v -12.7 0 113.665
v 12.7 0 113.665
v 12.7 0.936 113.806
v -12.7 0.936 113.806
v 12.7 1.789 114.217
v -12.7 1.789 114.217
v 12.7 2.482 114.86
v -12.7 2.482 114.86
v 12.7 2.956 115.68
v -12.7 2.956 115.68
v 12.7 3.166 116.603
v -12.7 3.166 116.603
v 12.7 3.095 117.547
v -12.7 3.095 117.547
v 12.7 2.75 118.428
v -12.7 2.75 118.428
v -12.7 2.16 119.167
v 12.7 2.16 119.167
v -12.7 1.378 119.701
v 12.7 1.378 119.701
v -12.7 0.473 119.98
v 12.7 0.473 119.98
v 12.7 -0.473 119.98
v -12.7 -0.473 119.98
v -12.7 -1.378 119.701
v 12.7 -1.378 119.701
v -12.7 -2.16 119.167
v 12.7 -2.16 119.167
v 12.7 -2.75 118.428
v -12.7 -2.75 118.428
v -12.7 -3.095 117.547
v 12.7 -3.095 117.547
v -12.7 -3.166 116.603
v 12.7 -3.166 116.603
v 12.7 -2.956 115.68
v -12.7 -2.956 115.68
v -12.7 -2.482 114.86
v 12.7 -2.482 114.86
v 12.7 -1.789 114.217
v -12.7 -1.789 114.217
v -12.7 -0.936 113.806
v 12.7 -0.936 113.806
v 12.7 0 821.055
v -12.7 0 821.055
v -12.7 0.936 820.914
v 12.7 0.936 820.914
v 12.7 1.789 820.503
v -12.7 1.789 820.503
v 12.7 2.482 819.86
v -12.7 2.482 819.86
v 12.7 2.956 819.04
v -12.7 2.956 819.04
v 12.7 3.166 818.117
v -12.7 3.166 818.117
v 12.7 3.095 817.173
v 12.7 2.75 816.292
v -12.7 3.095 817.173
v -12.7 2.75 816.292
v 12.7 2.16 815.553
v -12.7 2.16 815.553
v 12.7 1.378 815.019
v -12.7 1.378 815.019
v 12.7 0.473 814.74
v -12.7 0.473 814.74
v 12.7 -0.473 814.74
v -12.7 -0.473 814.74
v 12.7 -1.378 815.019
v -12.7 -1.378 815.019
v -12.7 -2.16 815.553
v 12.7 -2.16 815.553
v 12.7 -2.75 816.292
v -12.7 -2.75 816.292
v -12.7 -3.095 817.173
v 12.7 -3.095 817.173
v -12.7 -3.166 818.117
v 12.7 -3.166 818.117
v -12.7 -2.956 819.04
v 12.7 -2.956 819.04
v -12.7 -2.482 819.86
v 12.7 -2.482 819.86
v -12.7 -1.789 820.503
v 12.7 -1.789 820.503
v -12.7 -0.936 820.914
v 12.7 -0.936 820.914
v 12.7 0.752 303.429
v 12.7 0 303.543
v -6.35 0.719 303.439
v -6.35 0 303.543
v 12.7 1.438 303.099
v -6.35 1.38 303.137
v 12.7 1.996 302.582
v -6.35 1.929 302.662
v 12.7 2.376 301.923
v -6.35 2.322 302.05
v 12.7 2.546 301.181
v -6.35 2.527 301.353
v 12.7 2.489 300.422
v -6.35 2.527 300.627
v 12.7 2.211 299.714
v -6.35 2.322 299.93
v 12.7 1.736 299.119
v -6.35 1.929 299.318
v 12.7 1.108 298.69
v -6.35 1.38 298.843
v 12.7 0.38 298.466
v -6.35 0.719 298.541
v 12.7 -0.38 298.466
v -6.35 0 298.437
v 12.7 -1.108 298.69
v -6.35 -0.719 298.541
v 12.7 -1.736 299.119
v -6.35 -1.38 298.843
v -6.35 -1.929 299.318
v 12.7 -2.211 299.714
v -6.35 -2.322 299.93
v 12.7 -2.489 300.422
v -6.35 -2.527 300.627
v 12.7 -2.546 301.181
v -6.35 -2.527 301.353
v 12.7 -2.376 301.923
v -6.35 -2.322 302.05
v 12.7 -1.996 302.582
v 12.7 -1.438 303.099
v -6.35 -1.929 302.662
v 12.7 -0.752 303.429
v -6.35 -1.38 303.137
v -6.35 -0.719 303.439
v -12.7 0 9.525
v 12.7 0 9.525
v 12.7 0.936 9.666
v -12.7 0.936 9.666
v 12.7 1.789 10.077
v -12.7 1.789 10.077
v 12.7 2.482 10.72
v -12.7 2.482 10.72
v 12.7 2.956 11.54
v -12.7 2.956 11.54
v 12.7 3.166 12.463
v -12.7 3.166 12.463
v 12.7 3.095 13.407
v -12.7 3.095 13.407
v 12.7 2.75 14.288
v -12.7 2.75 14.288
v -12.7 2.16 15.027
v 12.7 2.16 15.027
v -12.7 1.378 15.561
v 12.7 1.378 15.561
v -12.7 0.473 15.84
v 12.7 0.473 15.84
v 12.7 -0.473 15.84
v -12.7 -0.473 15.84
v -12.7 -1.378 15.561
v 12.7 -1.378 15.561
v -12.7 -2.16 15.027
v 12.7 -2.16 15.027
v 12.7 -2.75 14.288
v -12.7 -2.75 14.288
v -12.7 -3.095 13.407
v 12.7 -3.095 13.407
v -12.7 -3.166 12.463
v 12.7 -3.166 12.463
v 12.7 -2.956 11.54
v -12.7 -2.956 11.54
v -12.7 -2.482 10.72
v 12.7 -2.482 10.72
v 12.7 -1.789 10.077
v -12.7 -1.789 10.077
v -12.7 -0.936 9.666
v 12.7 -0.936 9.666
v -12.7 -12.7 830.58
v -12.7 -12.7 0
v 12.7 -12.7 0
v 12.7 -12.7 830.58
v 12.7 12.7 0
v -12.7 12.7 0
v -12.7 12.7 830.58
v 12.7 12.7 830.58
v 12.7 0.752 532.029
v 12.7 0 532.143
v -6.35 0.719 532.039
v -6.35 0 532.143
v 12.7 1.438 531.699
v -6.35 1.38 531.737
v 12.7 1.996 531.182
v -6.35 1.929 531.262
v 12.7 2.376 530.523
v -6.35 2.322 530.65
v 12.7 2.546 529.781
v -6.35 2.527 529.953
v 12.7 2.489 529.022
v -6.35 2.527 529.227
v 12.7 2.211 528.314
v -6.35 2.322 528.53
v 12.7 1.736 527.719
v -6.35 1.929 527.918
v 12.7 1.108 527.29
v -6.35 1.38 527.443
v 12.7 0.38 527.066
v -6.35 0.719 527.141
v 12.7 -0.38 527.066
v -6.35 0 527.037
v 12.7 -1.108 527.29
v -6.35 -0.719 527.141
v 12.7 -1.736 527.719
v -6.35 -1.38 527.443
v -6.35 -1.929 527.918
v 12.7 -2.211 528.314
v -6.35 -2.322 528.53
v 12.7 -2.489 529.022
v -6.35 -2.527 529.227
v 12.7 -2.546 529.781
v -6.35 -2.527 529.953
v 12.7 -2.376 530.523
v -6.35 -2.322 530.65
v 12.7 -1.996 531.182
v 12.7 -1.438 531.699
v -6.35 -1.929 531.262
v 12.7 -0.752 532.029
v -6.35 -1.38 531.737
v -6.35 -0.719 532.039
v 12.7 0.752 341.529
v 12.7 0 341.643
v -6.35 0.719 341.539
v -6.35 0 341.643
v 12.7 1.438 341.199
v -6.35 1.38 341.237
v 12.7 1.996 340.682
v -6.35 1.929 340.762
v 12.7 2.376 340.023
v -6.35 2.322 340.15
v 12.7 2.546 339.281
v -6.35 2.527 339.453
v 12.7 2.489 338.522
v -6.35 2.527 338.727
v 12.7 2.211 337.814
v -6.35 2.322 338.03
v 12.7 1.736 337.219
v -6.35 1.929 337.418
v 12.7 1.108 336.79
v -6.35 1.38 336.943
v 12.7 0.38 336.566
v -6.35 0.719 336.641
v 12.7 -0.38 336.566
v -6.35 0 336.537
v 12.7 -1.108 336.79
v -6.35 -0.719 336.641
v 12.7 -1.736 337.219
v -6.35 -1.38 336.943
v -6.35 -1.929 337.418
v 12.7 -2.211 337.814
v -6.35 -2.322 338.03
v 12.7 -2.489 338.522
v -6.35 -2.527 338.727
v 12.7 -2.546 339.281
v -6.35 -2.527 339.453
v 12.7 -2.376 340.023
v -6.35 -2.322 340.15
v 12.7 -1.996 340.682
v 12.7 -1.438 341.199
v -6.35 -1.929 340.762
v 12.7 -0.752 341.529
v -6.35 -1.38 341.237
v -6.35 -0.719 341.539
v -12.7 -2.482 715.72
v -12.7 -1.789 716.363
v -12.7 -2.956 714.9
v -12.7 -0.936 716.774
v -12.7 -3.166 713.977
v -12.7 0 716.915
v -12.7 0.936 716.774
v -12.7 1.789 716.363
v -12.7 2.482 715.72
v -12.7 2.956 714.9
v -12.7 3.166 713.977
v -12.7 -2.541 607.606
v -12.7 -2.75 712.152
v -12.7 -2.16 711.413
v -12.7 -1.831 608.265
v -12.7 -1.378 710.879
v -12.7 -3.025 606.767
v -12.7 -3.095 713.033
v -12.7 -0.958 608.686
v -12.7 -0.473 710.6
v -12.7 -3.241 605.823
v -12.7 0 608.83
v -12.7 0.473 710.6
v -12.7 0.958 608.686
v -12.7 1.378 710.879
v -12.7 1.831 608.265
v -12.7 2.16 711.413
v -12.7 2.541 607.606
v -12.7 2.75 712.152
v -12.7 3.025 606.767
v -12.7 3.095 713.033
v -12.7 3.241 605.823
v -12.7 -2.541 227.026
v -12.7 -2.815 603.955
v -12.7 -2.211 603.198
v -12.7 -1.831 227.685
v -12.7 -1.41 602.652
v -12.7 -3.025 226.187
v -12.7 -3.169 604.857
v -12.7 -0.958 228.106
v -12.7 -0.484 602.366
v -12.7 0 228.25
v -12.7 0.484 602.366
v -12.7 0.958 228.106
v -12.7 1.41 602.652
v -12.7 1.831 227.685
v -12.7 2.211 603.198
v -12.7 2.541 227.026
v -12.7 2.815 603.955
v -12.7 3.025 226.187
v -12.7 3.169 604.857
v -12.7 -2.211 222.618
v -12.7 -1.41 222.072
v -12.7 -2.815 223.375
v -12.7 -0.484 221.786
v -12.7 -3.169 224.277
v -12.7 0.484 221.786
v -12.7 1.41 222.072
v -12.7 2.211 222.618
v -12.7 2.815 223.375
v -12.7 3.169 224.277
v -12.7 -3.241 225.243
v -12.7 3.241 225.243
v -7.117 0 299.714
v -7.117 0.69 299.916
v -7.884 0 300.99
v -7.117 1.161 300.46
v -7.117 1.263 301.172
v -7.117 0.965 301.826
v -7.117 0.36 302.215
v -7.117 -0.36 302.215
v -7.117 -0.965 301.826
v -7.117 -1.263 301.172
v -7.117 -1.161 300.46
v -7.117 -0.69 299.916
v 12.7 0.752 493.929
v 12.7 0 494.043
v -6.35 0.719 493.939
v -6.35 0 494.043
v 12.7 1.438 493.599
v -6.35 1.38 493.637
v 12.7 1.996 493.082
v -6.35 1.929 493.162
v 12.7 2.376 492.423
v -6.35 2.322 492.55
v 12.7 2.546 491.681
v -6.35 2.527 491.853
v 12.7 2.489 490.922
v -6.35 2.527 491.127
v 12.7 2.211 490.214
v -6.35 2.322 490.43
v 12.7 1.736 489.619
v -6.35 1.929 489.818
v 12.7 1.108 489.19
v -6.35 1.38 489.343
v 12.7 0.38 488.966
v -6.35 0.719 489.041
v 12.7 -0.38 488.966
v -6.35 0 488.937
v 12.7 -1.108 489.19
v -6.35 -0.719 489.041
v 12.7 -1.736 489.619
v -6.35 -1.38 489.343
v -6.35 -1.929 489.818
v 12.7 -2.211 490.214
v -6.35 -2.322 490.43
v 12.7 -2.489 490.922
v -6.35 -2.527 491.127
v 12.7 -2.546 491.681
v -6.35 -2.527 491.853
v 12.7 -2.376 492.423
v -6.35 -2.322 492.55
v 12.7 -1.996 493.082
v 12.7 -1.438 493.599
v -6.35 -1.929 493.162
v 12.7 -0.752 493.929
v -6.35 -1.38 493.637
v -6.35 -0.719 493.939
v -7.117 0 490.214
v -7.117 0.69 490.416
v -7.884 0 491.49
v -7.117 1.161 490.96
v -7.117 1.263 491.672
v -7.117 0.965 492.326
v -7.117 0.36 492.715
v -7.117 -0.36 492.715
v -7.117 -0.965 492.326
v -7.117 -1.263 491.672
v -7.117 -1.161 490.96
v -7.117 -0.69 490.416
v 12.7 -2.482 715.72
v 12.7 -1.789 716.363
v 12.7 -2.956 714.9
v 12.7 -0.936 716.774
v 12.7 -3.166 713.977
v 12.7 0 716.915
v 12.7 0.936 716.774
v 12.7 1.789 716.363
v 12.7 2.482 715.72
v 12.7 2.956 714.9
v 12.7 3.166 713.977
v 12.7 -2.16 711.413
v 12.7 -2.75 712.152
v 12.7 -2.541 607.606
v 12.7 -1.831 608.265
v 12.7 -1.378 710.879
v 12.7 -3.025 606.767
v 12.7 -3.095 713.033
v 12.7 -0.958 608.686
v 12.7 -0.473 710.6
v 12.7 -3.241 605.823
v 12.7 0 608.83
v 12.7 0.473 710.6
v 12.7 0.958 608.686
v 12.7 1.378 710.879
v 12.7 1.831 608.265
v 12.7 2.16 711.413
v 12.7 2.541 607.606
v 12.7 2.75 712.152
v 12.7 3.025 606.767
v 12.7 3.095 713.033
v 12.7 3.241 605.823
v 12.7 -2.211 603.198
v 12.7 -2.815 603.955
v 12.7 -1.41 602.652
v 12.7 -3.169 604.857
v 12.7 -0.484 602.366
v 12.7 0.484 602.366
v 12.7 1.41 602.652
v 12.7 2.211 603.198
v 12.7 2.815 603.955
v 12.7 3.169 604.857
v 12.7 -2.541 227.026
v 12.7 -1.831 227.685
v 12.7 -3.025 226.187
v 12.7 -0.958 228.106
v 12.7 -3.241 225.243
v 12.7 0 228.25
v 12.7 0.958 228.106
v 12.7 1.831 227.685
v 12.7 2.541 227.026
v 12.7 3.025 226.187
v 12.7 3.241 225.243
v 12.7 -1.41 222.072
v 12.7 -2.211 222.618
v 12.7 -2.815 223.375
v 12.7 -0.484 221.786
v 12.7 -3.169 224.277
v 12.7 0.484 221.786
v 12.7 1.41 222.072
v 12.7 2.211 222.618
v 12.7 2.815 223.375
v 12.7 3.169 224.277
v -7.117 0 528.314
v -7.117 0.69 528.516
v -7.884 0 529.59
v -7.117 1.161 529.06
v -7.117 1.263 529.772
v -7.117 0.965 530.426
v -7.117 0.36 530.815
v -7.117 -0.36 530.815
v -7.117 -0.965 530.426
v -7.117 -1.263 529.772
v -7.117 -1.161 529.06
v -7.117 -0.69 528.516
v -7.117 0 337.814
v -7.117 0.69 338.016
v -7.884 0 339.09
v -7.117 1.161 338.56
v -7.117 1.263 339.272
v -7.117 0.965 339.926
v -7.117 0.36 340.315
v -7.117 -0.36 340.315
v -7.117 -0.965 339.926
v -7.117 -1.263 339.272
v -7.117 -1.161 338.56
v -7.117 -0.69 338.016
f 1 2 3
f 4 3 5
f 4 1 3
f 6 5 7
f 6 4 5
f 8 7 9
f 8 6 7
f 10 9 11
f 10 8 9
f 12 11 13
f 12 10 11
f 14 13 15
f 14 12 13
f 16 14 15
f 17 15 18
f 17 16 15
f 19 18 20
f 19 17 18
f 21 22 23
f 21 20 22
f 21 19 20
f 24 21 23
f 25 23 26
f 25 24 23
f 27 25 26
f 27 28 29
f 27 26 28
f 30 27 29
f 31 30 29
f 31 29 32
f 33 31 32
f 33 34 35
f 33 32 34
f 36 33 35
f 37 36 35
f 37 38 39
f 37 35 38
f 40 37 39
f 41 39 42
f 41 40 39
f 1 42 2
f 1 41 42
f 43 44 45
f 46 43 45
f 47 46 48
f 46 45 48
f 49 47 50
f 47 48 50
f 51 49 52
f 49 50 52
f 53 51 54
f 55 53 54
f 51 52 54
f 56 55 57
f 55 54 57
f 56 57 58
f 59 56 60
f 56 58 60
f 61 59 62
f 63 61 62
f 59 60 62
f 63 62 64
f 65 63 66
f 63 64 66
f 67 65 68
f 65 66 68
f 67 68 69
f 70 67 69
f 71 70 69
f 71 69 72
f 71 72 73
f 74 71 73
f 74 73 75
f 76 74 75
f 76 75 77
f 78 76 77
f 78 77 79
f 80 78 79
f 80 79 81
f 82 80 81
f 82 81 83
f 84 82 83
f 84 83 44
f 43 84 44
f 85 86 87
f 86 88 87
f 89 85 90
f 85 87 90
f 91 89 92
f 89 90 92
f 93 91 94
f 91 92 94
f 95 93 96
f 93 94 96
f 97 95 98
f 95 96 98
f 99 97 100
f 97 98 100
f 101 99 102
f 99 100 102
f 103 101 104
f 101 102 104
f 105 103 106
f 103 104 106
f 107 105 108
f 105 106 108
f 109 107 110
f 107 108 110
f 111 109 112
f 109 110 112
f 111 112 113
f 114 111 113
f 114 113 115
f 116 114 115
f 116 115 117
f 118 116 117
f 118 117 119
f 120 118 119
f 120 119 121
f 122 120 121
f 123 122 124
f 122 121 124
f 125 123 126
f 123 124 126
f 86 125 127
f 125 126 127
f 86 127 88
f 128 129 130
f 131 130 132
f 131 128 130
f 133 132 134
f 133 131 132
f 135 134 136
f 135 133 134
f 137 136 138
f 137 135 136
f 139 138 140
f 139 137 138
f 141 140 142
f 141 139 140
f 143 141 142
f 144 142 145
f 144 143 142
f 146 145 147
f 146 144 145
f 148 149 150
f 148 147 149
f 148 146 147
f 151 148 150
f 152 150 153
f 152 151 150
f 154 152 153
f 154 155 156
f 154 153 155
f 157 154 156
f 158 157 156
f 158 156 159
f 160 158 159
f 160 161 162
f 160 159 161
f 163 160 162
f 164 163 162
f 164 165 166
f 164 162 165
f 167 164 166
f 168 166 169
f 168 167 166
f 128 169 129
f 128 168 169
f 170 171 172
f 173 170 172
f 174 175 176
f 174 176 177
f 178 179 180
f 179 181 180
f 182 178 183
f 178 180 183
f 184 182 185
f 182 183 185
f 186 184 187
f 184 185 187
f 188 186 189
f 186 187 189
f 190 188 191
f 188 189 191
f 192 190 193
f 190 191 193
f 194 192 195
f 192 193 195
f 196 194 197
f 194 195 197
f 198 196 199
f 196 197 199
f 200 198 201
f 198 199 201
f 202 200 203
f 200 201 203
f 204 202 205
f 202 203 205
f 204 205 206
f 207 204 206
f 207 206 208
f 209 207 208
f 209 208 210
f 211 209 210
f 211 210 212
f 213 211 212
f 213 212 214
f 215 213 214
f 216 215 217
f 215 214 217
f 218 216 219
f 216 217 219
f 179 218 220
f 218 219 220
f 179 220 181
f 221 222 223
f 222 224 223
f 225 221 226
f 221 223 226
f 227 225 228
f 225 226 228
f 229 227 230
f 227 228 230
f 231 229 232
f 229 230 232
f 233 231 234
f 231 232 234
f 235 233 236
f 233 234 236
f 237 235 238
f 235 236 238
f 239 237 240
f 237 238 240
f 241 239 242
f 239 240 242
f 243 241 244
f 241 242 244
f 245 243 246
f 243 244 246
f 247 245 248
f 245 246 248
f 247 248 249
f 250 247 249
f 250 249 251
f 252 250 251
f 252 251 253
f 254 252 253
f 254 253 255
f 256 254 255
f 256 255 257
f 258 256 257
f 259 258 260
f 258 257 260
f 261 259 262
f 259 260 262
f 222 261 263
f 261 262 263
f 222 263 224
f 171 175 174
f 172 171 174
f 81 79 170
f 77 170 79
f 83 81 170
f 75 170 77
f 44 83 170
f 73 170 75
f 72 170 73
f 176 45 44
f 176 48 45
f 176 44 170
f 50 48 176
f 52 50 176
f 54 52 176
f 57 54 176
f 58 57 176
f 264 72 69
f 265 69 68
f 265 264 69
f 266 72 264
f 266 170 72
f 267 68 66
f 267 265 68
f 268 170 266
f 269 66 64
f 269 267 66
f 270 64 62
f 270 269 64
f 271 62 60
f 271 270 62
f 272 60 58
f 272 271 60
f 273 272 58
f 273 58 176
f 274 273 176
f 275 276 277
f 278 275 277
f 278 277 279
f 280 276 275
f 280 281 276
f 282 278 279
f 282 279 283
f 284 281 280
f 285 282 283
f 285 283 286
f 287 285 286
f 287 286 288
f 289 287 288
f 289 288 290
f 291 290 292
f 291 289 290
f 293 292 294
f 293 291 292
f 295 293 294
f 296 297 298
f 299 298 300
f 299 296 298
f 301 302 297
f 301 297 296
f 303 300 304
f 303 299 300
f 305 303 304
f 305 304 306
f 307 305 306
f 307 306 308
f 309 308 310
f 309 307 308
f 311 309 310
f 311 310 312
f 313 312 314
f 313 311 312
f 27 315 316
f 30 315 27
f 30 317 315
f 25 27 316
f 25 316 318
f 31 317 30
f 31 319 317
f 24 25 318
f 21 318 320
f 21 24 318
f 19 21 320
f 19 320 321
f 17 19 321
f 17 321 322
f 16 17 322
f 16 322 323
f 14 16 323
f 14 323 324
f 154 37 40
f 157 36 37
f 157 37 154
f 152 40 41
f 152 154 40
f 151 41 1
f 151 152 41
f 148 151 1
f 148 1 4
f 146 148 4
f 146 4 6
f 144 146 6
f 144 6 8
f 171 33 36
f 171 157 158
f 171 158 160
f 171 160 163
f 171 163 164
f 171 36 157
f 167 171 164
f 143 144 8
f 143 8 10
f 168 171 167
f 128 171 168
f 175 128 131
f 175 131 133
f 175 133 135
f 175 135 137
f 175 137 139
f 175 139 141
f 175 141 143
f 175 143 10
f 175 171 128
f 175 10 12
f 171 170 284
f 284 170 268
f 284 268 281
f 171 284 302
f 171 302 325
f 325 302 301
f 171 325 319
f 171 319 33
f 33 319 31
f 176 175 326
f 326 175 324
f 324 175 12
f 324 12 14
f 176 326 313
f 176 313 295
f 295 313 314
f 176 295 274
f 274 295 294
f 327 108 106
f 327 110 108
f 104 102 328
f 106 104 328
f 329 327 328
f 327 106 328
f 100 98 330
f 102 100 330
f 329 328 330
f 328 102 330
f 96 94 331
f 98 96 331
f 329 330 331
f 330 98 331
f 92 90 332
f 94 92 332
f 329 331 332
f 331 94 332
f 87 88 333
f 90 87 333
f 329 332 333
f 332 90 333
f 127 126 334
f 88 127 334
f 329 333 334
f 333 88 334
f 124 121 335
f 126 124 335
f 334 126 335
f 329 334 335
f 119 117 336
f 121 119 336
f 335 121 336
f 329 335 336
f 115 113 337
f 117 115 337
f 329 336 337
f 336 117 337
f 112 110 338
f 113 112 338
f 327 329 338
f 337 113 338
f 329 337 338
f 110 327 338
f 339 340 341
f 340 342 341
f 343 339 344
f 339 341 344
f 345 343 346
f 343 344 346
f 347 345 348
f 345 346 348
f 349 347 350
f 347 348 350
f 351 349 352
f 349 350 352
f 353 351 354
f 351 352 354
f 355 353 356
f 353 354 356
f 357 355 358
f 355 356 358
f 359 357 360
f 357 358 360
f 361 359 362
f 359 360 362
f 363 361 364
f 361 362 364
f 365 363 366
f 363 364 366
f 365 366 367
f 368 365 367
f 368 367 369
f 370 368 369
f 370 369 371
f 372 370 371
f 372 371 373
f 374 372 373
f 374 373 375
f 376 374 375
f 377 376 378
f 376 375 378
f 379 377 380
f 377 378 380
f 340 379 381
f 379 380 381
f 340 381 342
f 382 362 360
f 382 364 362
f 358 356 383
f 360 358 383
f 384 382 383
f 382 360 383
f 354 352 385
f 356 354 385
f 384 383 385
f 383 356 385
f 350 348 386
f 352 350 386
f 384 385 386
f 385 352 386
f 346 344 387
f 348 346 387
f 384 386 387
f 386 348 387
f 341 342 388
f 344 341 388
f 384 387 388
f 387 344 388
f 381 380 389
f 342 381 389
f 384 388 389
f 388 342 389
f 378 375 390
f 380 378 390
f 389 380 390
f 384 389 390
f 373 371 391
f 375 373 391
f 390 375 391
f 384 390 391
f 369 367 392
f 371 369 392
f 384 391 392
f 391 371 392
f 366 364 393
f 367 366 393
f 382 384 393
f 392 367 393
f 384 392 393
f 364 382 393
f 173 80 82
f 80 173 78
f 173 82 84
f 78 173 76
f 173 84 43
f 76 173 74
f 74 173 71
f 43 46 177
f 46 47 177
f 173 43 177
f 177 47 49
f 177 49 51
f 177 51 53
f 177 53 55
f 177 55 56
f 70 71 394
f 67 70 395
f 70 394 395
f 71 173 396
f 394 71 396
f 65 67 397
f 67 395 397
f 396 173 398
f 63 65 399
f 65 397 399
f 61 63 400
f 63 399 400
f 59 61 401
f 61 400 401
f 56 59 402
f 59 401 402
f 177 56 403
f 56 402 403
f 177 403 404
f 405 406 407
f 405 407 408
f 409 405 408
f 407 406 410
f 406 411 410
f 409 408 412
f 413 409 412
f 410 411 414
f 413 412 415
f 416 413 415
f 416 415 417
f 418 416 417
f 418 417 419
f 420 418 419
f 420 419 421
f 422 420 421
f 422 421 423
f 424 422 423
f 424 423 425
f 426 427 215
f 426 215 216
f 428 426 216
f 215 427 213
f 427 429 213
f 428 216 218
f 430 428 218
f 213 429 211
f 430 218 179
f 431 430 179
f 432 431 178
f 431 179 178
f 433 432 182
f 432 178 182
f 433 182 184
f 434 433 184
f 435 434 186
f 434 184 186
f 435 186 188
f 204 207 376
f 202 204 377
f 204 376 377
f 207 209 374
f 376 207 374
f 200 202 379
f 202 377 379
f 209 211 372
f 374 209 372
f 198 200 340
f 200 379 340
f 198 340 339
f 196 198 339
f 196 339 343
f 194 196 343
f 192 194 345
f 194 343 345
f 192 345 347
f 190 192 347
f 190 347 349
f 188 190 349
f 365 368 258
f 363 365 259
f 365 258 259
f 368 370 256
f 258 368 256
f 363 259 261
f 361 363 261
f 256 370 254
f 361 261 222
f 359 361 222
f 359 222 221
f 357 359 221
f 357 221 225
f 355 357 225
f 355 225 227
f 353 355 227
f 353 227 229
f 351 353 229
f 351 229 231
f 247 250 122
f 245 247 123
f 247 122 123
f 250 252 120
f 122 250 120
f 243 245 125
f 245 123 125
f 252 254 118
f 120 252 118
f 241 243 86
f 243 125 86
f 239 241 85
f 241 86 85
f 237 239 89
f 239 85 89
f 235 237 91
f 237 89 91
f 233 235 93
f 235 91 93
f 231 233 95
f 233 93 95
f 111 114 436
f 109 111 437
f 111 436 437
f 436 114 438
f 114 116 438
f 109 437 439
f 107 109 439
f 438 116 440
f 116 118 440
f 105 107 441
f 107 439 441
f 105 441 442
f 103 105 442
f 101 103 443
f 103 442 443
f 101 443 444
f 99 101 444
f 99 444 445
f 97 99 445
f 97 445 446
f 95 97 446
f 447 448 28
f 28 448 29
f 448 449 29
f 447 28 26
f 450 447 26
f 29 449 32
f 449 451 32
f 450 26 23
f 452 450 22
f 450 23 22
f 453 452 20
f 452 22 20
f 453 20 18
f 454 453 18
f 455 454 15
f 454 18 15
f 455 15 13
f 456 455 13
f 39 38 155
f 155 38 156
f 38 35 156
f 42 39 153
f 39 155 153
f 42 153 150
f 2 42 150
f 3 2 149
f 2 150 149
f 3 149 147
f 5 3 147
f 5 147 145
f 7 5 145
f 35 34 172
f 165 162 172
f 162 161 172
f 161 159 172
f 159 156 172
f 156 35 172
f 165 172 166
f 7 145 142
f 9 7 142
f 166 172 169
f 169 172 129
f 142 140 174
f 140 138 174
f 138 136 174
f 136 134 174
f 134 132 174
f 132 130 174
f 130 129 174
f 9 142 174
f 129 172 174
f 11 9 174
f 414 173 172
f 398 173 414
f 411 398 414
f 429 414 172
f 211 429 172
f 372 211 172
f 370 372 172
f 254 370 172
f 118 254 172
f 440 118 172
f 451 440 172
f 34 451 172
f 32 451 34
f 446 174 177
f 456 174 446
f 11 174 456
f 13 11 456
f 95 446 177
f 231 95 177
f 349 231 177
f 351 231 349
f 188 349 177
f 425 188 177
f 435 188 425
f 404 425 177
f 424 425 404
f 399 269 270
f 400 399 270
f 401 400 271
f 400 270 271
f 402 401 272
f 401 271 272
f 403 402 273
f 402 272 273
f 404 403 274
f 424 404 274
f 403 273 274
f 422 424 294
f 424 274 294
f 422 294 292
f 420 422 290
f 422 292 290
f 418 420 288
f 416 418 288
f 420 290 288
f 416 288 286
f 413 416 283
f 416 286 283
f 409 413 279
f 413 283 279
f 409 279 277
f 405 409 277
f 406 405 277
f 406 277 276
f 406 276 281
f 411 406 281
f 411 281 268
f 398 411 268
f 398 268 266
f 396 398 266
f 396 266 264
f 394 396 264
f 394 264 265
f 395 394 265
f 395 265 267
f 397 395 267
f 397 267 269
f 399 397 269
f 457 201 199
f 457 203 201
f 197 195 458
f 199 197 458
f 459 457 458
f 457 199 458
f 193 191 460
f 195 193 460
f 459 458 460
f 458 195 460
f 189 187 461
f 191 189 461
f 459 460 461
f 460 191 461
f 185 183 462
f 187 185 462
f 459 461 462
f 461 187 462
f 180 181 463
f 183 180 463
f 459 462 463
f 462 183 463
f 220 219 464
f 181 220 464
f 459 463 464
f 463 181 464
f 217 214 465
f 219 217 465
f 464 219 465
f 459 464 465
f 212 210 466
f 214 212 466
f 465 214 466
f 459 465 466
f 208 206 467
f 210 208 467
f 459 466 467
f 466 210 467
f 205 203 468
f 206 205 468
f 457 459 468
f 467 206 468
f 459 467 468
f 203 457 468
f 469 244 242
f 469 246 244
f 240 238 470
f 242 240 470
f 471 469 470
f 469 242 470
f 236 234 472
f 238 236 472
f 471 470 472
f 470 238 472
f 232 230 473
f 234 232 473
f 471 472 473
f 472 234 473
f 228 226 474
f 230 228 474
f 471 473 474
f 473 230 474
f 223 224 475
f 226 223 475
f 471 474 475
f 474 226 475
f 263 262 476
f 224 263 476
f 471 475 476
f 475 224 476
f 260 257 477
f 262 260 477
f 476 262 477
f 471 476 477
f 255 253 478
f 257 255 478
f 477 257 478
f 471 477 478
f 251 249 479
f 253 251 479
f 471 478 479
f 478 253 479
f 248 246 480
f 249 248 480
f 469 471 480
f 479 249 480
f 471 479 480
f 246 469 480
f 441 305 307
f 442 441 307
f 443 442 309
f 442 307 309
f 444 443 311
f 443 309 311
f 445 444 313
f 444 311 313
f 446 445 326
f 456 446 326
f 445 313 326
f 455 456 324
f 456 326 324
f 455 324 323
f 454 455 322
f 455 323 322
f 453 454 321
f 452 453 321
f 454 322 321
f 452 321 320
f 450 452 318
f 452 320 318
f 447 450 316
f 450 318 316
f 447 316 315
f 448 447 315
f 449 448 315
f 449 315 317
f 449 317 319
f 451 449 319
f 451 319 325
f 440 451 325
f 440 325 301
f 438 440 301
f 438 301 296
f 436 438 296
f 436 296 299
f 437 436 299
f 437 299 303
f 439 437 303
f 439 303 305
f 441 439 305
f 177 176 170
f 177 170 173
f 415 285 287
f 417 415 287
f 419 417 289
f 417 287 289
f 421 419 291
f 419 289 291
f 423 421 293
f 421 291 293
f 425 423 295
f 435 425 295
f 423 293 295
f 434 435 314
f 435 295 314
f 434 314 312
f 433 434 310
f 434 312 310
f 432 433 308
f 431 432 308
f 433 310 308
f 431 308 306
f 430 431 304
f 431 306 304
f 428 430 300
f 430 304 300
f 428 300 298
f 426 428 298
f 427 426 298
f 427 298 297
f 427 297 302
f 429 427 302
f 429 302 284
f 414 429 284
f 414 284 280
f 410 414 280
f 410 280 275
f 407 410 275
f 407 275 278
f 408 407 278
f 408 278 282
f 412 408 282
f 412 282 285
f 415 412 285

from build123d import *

# Parameters (mm, degrees)
SKETCH1_W                   = 25.4
SKETCH1_H                   = 25.4
BOSS_EXTRUDE1_DEPTH         = 830.58
SKETCH2_R                   = 3.175
CUT_EXTRUDE4_DEPTH          = 26.4
F_1_4_20_TAPPED_HOLE1_D     = 5.1054
F_1_4_20_TAPPED_HOLE1_DEPTH = 19.05
F_1_4_20_TAPPED_HOLE1_TIP   = 1.533816902
SKETCH7_R                   = 3.25
CUT_EXTRUDE5_DEPTH          = 26.4


with BuildPart() as part:
    # Sketch1 → Boss-Extrude1 (new body)
    with BuildSketch(Plane.XY):
        Rectangle(SKETCH1_W, SKETCH1_H)
    extrude(amount=BOSS_EXTRUDE1_DEPTH)

    # Sketch2 → Cut-Extrude4 (cut, through all)
    with BuildSketch(Plane(origin=(-12.7, 0, 0), x_dir=(0, 0, -1), z_dir=(1, 0, 0))):
        with Locations((-12.7, 0)):
            Circle(SKETCH2_R)
        with Locations((-116.84, 0)):
            Circle(SKETCH2_R)
    cut_extrude4 = extrude(amount=CUT_EXTRUDE4_DEPTH, mode=Mode.SUBTRACT)

    # Mirror1: Cut-Extrude4 across plane
    add(cut_extrude4.mirror(Plane(origin=(0, 0, 415.29), x_dir=(1, 0, 0), z_dir=(0, 0, -1))), mode=Mode.SUBTRACT)

    # 1/4-20 Tapped Hole1
    with Locations(Plane(origin=(12.7, 0, 0), x_dir=(0, 0, -1), z_dir=(1, 0, 0))):
        with Locations((-300.99, 0), (-529.59, 0), (-491.49, 0), (-339.09, 0)):
            Hole(F_1_4_20_TAPPED_HOLE1_D / 2, depth=F_1_4_20_TAPPED_HOLE1_DEPTH)
            with Locations((0, 0, -(F_1_4_20_TAPPED_HOLE1_DEPTH + F_1_4_20_TAPPED_HOLE1_TIP / 2))):  # 118° drill point
                Cone(0, F_1_4_20_TAPPED_HOLE1_D / 2, F_1_4_20_TAPPED_HOLE1_TIP, mode=Mode.SUBTRACT)

    # Sketch7 → Cut-Extrude5 (cut, through all)
    with BuildSketch(Plane.ZY.offset(12.7)):
        with Locations((605.58, 0)):
            Circle(SKETCH7_R)
        with Locations((225, 0)):
            Circle(SKETCH7_R)
    extrude(amount=-CUT_EXTRUDE5_DEPTH, mode=Mode.SUBTRACT)


solid = part.part
